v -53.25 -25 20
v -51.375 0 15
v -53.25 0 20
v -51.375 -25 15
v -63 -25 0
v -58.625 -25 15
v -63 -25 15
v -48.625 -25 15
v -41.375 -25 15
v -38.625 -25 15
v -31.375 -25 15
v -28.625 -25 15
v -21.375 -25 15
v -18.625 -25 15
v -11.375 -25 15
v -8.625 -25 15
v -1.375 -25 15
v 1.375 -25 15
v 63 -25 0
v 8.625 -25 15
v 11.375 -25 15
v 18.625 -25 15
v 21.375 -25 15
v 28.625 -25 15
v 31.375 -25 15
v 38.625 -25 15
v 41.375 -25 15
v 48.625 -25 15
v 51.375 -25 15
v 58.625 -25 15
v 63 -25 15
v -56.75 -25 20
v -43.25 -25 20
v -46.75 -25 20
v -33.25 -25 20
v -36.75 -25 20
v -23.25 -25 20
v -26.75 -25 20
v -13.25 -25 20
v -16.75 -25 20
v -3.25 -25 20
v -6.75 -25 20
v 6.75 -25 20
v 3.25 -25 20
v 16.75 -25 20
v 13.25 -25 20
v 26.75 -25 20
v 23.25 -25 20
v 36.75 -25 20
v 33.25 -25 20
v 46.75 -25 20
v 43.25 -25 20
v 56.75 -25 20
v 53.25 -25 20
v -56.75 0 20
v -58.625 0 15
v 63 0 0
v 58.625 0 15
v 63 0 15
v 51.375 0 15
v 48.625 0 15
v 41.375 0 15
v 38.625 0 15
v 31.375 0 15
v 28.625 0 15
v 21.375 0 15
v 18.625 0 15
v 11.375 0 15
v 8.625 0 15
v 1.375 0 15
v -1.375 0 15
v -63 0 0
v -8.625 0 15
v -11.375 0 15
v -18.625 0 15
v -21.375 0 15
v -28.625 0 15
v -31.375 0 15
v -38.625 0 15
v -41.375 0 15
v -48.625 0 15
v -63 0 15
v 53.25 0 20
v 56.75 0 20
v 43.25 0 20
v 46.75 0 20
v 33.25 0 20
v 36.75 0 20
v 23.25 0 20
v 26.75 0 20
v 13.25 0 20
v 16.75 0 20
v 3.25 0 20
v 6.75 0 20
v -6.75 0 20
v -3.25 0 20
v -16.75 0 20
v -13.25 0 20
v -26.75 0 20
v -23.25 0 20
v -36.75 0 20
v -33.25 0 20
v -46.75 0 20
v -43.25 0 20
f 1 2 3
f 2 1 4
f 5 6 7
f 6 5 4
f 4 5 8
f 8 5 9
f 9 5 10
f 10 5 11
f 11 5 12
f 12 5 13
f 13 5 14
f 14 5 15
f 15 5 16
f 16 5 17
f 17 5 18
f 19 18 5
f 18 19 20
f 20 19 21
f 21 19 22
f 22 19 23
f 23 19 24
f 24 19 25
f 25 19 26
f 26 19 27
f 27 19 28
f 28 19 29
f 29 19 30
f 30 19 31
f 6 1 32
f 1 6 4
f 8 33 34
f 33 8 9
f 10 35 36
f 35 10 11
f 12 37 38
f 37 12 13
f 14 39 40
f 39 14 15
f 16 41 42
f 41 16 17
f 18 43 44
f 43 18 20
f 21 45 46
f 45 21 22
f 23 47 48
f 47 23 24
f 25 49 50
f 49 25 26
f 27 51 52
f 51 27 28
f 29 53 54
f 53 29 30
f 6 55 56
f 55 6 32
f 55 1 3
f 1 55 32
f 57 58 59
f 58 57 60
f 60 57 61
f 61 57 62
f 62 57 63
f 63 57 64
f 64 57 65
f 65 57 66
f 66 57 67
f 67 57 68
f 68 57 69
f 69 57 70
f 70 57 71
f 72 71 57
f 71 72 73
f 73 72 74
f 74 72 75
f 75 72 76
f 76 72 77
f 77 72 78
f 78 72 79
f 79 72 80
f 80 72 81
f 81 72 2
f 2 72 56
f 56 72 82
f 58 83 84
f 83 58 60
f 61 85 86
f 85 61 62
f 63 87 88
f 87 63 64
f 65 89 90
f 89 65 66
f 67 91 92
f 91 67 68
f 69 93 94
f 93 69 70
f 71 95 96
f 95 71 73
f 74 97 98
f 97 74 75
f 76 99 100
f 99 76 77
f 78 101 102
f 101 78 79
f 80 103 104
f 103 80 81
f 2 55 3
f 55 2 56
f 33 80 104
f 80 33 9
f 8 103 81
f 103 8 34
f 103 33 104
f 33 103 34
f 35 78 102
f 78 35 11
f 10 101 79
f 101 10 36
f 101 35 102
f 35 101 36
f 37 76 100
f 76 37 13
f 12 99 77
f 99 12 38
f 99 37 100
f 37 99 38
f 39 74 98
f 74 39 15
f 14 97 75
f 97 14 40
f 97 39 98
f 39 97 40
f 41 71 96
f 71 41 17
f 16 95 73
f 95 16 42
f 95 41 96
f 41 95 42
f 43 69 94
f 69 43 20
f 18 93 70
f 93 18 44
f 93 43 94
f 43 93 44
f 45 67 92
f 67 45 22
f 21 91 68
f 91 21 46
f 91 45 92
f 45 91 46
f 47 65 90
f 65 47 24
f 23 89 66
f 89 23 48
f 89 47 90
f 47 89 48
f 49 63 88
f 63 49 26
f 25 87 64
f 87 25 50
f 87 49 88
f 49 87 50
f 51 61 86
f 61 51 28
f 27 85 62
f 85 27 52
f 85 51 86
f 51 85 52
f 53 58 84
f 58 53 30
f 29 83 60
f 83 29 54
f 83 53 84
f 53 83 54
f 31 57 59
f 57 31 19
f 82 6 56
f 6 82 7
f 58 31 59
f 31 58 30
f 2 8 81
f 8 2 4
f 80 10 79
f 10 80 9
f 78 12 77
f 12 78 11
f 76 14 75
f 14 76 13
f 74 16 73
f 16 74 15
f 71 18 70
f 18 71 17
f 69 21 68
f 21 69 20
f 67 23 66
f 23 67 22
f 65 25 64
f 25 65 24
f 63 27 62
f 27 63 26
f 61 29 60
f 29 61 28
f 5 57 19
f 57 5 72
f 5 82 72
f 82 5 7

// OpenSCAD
$fn = 32;

// ----------------------------------------------------------------------
// Toothed rack, 12 teeth
// 10 mm pitch, 5 mm teeth
// ----------------------------------------------------------------------

// --- parameters (mm) ---
bar_w = 25;     // bar width (Y)
bar_h = 15;     // bar height (Z)
teeth = 12;     // number of teeth
pitch = 10;     // tooth pitch
tooth_h = 5;    // tooth height above the bar
root_w = 8;     // tooth width at the root
crest_w = 3.5;  // tooth width at the crest

// --- derived feature positions (mm) ---
span = (teeth - 1) * pitch;  // = 110   distance between the outer teeth
bar_l = span + root_w + 8;   // = 126   bar length: teeth plus 4 mm at each end
tooth_x = -span / 2;         // = -55   X of the first tooth
height = bar_h + tooth_h;    // = 20   overall height
feature_centers = [
  [tooth_x + 0 * pitch, -bar_w / 2],
  [tooth_x + 1 * pitch, -bar_w / 2],
  [tooth_x + 2 * pitch, -bar_w / 2],
  [tooth_x + 3 * pitch, -bar_w / 2],
  [tooth_x + 4 * pitch, -bar_w / 2],
  [tooth_x + 5 * pitch, -bar_w / 2],
  [tooth_x + 6 * pitch, -bar_w / 2],
  [tooth_x + 7 * pitch, -bar_w / 2],
  [tooth_x + 8 * pitch, -bar_w / 2],
  [tooth_x + 9 * pitch, -bar_w / 2],
  [tooth_x + 10 * pitch, -bar_w / 2],
  [tooth_x + 11 * pitch, -bar_w / 2]
];   // tooth centre line, drives the tooth loop

// bar with a rack of teeth, one extruded trapezoium per centre
module rack_tooth() {
  linear_extrude(height = bar_w)
    polygon(points = [
      [0, 0],
      [root_w, 0],
      [root_w / 2 + crest_w / 2, tooth_h + 1],
      [root_w / 2 - crest_w / 2, tooth_h + 1]
    ]);
}

union() {
  translate([-bar_l / 2, -bar_w, 0]) cube([bar_l, bar_w, bar_h]);
  for (centre = feature_centers)
    translate([centre[0] - root_w / 2, 0, bar_h - 1]) rotate([90, 0, 0]) rack_tooth();
}
